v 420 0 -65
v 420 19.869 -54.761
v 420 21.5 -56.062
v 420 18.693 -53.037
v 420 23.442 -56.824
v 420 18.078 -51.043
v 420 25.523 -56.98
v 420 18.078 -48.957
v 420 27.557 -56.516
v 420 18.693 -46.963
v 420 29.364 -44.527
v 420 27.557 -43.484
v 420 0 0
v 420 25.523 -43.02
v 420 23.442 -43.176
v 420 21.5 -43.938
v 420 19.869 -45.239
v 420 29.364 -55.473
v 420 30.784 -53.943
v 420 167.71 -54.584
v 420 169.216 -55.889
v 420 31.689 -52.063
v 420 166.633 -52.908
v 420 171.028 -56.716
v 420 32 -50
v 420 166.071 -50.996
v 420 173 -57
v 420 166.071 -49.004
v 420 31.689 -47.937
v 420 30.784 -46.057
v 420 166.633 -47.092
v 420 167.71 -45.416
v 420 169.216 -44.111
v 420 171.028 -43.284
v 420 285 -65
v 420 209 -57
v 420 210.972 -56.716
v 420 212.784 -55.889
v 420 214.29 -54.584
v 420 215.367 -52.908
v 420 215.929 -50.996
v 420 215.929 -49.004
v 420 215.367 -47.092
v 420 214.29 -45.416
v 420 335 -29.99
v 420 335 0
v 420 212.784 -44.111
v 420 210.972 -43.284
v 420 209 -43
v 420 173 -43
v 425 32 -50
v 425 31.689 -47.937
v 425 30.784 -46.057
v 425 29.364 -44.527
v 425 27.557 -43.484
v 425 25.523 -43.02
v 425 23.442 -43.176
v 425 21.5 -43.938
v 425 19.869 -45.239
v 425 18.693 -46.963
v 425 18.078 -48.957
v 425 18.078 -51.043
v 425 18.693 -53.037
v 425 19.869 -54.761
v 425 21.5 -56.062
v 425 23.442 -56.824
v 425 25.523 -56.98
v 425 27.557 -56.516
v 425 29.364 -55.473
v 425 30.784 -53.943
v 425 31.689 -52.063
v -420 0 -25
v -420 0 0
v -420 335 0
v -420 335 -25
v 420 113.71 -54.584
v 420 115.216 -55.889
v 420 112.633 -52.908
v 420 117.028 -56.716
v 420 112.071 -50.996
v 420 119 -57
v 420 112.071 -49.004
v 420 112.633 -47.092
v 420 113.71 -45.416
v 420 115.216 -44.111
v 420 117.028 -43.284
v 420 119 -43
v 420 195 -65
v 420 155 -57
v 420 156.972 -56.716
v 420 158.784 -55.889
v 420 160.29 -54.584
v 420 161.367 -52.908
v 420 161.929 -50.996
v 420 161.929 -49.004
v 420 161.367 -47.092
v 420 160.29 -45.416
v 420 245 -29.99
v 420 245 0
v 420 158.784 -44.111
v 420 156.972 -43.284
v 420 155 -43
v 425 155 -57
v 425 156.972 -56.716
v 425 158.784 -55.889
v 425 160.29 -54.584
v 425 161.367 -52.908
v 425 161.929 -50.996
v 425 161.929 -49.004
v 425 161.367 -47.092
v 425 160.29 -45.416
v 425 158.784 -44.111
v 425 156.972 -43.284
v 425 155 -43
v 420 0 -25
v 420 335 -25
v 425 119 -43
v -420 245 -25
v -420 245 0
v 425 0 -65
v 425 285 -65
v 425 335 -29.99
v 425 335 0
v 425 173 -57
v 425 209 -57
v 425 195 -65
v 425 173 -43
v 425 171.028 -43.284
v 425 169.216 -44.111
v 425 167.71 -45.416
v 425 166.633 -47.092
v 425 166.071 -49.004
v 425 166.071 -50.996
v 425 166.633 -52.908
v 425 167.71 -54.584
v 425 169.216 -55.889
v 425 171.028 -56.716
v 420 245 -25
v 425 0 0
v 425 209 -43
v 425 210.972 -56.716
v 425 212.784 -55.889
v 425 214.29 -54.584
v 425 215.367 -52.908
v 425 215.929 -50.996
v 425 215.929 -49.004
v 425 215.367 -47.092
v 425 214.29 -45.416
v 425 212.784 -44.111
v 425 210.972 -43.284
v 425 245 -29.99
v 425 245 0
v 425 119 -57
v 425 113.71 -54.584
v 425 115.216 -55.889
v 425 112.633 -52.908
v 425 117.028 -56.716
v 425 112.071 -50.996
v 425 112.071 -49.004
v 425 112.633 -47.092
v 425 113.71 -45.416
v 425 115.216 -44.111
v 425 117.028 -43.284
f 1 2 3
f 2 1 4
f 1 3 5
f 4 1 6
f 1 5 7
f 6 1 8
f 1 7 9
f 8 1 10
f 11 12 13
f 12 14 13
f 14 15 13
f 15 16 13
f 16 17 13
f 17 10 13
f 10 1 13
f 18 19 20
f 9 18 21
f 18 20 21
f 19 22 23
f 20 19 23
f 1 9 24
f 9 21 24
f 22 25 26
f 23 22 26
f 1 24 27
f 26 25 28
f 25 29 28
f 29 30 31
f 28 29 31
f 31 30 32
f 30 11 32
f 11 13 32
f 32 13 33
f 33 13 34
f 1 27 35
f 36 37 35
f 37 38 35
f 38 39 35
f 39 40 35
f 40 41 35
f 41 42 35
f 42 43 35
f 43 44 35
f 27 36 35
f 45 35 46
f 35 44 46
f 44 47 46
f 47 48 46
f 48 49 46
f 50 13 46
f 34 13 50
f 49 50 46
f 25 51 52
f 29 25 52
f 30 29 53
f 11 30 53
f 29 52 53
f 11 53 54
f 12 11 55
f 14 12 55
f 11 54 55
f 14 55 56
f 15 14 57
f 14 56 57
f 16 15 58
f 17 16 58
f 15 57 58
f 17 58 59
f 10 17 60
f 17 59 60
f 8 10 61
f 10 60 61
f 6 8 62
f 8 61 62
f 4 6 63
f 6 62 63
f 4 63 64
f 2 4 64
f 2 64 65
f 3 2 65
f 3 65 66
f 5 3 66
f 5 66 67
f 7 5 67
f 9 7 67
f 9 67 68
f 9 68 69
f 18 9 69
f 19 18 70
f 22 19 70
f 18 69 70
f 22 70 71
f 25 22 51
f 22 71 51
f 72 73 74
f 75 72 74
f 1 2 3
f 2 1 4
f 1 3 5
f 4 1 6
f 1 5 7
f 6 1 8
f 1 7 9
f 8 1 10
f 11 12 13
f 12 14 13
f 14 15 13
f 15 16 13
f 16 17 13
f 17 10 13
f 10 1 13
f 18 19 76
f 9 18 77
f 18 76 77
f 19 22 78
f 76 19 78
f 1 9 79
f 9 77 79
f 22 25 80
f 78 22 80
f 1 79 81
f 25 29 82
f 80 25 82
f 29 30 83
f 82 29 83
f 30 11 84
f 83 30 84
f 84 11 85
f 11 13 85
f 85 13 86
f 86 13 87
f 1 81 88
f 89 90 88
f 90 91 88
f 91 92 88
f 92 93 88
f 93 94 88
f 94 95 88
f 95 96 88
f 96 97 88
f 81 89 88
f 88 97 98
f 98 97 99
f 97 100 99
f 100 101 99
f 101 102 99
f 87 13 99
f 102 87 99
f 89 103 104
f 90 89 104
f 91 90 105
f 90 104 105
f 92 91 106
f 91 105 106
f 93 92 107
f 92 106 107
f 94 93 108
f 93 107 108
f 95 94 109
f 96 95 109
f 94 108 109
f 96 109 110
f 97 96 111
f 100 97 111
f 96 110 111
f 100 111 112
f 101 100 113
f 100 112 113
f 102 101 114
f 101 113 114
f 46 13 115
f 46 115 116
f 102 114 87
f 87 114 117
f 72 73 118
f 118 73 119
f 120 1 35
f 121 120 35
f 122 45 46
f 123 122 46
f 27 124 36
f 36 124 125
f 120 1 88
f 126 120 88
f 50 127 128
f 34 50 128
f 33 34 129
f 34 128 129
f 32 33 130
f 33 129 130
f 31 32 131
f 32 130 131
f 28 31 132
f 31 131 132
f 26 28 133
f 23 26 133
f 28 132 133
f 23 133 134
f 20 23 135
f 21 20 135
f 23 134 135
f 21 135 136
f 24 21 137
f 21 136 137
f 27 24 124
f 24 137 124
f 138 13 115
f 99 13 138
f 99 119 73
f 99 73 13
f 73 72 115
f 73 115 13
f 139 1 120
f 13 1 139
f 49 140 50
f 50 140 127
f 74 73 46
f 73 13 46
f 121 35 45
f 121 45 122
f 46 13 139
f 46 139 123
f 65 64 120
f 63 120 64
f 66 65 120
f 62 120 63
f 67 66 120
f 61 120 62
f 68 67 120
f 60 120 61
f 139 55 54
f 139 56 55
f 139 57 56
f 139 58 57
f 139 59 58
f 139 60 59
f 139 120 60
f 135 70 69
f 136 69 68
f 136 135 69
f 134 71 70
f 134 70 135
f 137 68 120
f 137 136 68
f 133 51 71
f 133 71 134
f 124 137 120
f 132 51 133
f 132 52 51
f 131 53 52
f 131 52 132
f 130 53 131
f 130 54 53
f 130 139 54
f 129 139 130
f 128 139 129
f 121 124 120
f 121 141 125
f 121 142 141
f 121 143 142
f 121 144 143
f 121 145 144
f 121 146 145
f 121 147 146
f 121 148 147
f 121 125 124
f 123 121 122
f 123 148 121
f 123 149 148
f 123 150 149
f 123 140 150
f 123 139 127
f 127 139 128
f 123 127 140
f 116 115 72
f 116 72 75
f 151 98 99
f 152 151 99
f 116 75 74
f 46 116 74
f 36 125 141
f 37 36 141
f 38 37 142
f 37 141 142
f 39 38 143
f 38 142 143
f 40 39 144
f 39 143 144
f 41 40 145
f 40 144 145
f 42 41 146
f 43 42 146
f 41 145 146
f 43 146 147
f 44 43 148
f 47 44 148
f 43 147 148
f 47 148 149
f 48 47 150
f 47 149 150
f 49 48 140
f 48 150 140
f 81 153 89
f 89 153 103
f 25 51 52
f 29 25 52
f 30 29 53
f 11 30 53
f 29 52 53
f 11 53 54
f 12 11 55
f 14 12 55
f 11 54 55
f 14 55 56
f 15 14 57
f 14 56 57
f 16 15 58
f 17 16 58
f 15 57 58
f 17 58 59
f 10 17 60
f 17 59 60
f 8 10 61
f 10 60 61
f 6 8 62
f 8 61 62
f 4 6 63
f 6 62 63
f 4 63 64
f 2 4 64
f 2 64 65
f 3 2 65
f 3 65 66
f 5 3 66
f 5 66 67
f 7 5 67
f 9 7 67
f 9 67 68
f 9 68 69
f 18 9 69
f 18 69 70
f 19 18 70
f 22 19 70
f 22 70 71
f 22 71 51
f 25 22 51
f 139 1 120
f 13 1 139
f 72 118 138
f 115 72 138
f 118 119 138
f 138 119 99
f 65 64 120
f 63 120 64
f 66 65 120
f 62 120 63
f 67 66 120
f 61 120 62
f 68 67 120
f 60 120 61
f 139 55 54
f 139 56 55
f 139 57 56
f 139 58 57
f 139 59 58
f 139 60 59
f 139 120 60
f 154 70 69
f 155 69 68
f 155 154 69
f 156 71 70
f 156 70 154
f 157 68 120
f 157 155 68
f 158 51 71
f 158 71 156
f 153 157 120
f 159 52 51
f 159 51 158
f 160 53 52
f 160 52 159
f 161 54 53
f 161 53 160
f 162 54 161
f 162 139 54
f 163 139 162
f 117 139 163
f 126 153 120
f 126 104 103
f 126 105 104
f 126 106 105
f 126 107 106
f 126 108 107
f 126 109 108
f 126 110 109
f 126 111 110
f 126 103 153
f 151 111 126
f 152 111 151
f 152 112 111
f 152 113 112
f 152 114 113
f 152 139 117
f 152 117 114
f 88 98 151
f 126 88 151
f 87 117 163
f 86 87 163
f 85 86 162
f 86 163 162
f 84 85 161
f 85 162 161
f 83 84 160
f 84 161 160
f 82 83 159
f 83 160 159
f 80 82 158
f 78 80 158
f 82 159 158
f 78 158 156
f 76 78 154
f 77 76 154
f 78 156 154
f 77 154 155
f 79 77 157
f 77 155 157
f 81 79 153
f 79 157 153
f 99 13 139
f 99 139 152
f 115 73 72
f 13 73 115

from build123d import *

# Parameters (mm, degrees)
F0_W           = 840
F0_H           = 245
F1_DEPTH       = 25
F2_W           = 245
F2_H           = 65
F3_DEPTH       = 5
F4_SIZE2       = 35.0103769105
F4_SIZE        = 50
F5_R           = 7
F6_DEPTH       = 25
F16_W          = 335
F16_H          = 25
F17_DEPTH      = 420
F17_DEPTH_BACK = 420
F18_W          = 335
F18_H          = 65
F19_DEPTH      = 5
F20_SIZE2      = 35.0103769105
F20_SIZE       = 50
F21_R          = 7
F22_DEPTH      = 5


with BuildPart() as f1:
    # F0 (on Top) → F1 (new body)
    with BuildSketch(Plane.XY):
        with Locations((0, 122.5)):
            Rectangle(F0_W, F0_H)
    extrude(amount=-F1_DEPTH)


with BuildPart() as f3:
    # F2 (on face) → F3 (new body)
    with BuildSketch(Plane.YZ.offset(420)):
        with Locations((122.5, -32.5)):
            Rectangle(F2_W, F2_H)
    extrude(amount=F3_DEPTH)

    # F4
    f4_edges = [f3.edges().sort_by_distance(p)[0] for p in [
        (422.5, 245, -65),
    ]]
    f4_side = f3.faces().sort_by_distance((422.5, 122.5, -65))[0]
    chamfer(f4_edges, length=F4_SIZE, length2=F4_SIZE2, reference=f4_side)

    # F5 (on face) → F6 (cut)
    with BuildSketch(Plane.YZ.offset(425)):
        with Locations((25, -50)):
            Circle(F5_R)
        with BuildLine():
            Line((155, -43), (119, -43))
            ThreePointArc((119, -43), (112, -50), (119, -57))
            Line((119, -57), (155, -57))
            ThreePointArc((155, -57), (162, -50), (155, -43))
        make_face()
    extrude(amount=-F6_DEPTH, mode=Mode.SUBTRACT)


with BuildPart() as f7_1:
    # F7: copy of F3
    add(f3.part.moved(Location((-845, 0, 0))))


with BuildPart() as f8_1:
    # F8: copy of F1
    add(f1.part)


with BuildPart() as f10_1:
    # F10: copy of F3
    add(f3.part.moved(Location((5, 0, 0))))


with BuildPart() as f11_1:
    # F11: copy of F8_1
    add(f8_1.part)


with BuildPart() as f13_1:
    # F13: copy of F3
    add(f3.part)


with BuildPart() as f17:
    # F16 (on Right) → F17 (new body, two sides)
    with BuildSketch(Plane.YZ) as f17_sk:
        with Locations((167.5, -12.5)):
            Rectangle(F16_W, F16_H)
    extrude(amount=F17_DEPTH)
    extrude(f17_sk.sketch, amount=-F17_DEPTH_BACK)


with BuildPart() as f19:
    # F18 (on face) → F19 (new body)
    with BuildSketch(Plane.YZ.offset(420)):
        with Locations((167.5, -32.5)):
            Rectangle(F18_W, F18_H)
    extrude(amount=F19_DEPTH)

    # F20
    f20_edges = [f19.edges().sort_by_distance(p)[0] for p in [
        (422.5, 335, -65),
    ]]
    f20_side = f19.faces().sort_by_distance((422.5, 167.5, -65))[0]
    chamfer(f20_edges, length=F20_SIZE, length2=F20_SIZE2, reference=f20_side)

    # F21 (on face) → F22 (cut, through all)
    with BuildSketch(Plane.YZ.offset(425)):
        with Locations((25, -50)):
            Circle(F21_R)
        with BuildLine():
            Line((209, -43), (173, -43))
            ThreePointArc((173, -43), (166, -50), (173, -57))
            Line((173, -57), (209, -57))
            ThreePointArc((209, -57), (216, -50), (209, -43))
        make_face()
    extrude(amount=-F22_DEPTH, mode=Mode.SUBTRACT)


solid = Compound([f11_1.part, f13_1.part, f17.part, f19.part])
